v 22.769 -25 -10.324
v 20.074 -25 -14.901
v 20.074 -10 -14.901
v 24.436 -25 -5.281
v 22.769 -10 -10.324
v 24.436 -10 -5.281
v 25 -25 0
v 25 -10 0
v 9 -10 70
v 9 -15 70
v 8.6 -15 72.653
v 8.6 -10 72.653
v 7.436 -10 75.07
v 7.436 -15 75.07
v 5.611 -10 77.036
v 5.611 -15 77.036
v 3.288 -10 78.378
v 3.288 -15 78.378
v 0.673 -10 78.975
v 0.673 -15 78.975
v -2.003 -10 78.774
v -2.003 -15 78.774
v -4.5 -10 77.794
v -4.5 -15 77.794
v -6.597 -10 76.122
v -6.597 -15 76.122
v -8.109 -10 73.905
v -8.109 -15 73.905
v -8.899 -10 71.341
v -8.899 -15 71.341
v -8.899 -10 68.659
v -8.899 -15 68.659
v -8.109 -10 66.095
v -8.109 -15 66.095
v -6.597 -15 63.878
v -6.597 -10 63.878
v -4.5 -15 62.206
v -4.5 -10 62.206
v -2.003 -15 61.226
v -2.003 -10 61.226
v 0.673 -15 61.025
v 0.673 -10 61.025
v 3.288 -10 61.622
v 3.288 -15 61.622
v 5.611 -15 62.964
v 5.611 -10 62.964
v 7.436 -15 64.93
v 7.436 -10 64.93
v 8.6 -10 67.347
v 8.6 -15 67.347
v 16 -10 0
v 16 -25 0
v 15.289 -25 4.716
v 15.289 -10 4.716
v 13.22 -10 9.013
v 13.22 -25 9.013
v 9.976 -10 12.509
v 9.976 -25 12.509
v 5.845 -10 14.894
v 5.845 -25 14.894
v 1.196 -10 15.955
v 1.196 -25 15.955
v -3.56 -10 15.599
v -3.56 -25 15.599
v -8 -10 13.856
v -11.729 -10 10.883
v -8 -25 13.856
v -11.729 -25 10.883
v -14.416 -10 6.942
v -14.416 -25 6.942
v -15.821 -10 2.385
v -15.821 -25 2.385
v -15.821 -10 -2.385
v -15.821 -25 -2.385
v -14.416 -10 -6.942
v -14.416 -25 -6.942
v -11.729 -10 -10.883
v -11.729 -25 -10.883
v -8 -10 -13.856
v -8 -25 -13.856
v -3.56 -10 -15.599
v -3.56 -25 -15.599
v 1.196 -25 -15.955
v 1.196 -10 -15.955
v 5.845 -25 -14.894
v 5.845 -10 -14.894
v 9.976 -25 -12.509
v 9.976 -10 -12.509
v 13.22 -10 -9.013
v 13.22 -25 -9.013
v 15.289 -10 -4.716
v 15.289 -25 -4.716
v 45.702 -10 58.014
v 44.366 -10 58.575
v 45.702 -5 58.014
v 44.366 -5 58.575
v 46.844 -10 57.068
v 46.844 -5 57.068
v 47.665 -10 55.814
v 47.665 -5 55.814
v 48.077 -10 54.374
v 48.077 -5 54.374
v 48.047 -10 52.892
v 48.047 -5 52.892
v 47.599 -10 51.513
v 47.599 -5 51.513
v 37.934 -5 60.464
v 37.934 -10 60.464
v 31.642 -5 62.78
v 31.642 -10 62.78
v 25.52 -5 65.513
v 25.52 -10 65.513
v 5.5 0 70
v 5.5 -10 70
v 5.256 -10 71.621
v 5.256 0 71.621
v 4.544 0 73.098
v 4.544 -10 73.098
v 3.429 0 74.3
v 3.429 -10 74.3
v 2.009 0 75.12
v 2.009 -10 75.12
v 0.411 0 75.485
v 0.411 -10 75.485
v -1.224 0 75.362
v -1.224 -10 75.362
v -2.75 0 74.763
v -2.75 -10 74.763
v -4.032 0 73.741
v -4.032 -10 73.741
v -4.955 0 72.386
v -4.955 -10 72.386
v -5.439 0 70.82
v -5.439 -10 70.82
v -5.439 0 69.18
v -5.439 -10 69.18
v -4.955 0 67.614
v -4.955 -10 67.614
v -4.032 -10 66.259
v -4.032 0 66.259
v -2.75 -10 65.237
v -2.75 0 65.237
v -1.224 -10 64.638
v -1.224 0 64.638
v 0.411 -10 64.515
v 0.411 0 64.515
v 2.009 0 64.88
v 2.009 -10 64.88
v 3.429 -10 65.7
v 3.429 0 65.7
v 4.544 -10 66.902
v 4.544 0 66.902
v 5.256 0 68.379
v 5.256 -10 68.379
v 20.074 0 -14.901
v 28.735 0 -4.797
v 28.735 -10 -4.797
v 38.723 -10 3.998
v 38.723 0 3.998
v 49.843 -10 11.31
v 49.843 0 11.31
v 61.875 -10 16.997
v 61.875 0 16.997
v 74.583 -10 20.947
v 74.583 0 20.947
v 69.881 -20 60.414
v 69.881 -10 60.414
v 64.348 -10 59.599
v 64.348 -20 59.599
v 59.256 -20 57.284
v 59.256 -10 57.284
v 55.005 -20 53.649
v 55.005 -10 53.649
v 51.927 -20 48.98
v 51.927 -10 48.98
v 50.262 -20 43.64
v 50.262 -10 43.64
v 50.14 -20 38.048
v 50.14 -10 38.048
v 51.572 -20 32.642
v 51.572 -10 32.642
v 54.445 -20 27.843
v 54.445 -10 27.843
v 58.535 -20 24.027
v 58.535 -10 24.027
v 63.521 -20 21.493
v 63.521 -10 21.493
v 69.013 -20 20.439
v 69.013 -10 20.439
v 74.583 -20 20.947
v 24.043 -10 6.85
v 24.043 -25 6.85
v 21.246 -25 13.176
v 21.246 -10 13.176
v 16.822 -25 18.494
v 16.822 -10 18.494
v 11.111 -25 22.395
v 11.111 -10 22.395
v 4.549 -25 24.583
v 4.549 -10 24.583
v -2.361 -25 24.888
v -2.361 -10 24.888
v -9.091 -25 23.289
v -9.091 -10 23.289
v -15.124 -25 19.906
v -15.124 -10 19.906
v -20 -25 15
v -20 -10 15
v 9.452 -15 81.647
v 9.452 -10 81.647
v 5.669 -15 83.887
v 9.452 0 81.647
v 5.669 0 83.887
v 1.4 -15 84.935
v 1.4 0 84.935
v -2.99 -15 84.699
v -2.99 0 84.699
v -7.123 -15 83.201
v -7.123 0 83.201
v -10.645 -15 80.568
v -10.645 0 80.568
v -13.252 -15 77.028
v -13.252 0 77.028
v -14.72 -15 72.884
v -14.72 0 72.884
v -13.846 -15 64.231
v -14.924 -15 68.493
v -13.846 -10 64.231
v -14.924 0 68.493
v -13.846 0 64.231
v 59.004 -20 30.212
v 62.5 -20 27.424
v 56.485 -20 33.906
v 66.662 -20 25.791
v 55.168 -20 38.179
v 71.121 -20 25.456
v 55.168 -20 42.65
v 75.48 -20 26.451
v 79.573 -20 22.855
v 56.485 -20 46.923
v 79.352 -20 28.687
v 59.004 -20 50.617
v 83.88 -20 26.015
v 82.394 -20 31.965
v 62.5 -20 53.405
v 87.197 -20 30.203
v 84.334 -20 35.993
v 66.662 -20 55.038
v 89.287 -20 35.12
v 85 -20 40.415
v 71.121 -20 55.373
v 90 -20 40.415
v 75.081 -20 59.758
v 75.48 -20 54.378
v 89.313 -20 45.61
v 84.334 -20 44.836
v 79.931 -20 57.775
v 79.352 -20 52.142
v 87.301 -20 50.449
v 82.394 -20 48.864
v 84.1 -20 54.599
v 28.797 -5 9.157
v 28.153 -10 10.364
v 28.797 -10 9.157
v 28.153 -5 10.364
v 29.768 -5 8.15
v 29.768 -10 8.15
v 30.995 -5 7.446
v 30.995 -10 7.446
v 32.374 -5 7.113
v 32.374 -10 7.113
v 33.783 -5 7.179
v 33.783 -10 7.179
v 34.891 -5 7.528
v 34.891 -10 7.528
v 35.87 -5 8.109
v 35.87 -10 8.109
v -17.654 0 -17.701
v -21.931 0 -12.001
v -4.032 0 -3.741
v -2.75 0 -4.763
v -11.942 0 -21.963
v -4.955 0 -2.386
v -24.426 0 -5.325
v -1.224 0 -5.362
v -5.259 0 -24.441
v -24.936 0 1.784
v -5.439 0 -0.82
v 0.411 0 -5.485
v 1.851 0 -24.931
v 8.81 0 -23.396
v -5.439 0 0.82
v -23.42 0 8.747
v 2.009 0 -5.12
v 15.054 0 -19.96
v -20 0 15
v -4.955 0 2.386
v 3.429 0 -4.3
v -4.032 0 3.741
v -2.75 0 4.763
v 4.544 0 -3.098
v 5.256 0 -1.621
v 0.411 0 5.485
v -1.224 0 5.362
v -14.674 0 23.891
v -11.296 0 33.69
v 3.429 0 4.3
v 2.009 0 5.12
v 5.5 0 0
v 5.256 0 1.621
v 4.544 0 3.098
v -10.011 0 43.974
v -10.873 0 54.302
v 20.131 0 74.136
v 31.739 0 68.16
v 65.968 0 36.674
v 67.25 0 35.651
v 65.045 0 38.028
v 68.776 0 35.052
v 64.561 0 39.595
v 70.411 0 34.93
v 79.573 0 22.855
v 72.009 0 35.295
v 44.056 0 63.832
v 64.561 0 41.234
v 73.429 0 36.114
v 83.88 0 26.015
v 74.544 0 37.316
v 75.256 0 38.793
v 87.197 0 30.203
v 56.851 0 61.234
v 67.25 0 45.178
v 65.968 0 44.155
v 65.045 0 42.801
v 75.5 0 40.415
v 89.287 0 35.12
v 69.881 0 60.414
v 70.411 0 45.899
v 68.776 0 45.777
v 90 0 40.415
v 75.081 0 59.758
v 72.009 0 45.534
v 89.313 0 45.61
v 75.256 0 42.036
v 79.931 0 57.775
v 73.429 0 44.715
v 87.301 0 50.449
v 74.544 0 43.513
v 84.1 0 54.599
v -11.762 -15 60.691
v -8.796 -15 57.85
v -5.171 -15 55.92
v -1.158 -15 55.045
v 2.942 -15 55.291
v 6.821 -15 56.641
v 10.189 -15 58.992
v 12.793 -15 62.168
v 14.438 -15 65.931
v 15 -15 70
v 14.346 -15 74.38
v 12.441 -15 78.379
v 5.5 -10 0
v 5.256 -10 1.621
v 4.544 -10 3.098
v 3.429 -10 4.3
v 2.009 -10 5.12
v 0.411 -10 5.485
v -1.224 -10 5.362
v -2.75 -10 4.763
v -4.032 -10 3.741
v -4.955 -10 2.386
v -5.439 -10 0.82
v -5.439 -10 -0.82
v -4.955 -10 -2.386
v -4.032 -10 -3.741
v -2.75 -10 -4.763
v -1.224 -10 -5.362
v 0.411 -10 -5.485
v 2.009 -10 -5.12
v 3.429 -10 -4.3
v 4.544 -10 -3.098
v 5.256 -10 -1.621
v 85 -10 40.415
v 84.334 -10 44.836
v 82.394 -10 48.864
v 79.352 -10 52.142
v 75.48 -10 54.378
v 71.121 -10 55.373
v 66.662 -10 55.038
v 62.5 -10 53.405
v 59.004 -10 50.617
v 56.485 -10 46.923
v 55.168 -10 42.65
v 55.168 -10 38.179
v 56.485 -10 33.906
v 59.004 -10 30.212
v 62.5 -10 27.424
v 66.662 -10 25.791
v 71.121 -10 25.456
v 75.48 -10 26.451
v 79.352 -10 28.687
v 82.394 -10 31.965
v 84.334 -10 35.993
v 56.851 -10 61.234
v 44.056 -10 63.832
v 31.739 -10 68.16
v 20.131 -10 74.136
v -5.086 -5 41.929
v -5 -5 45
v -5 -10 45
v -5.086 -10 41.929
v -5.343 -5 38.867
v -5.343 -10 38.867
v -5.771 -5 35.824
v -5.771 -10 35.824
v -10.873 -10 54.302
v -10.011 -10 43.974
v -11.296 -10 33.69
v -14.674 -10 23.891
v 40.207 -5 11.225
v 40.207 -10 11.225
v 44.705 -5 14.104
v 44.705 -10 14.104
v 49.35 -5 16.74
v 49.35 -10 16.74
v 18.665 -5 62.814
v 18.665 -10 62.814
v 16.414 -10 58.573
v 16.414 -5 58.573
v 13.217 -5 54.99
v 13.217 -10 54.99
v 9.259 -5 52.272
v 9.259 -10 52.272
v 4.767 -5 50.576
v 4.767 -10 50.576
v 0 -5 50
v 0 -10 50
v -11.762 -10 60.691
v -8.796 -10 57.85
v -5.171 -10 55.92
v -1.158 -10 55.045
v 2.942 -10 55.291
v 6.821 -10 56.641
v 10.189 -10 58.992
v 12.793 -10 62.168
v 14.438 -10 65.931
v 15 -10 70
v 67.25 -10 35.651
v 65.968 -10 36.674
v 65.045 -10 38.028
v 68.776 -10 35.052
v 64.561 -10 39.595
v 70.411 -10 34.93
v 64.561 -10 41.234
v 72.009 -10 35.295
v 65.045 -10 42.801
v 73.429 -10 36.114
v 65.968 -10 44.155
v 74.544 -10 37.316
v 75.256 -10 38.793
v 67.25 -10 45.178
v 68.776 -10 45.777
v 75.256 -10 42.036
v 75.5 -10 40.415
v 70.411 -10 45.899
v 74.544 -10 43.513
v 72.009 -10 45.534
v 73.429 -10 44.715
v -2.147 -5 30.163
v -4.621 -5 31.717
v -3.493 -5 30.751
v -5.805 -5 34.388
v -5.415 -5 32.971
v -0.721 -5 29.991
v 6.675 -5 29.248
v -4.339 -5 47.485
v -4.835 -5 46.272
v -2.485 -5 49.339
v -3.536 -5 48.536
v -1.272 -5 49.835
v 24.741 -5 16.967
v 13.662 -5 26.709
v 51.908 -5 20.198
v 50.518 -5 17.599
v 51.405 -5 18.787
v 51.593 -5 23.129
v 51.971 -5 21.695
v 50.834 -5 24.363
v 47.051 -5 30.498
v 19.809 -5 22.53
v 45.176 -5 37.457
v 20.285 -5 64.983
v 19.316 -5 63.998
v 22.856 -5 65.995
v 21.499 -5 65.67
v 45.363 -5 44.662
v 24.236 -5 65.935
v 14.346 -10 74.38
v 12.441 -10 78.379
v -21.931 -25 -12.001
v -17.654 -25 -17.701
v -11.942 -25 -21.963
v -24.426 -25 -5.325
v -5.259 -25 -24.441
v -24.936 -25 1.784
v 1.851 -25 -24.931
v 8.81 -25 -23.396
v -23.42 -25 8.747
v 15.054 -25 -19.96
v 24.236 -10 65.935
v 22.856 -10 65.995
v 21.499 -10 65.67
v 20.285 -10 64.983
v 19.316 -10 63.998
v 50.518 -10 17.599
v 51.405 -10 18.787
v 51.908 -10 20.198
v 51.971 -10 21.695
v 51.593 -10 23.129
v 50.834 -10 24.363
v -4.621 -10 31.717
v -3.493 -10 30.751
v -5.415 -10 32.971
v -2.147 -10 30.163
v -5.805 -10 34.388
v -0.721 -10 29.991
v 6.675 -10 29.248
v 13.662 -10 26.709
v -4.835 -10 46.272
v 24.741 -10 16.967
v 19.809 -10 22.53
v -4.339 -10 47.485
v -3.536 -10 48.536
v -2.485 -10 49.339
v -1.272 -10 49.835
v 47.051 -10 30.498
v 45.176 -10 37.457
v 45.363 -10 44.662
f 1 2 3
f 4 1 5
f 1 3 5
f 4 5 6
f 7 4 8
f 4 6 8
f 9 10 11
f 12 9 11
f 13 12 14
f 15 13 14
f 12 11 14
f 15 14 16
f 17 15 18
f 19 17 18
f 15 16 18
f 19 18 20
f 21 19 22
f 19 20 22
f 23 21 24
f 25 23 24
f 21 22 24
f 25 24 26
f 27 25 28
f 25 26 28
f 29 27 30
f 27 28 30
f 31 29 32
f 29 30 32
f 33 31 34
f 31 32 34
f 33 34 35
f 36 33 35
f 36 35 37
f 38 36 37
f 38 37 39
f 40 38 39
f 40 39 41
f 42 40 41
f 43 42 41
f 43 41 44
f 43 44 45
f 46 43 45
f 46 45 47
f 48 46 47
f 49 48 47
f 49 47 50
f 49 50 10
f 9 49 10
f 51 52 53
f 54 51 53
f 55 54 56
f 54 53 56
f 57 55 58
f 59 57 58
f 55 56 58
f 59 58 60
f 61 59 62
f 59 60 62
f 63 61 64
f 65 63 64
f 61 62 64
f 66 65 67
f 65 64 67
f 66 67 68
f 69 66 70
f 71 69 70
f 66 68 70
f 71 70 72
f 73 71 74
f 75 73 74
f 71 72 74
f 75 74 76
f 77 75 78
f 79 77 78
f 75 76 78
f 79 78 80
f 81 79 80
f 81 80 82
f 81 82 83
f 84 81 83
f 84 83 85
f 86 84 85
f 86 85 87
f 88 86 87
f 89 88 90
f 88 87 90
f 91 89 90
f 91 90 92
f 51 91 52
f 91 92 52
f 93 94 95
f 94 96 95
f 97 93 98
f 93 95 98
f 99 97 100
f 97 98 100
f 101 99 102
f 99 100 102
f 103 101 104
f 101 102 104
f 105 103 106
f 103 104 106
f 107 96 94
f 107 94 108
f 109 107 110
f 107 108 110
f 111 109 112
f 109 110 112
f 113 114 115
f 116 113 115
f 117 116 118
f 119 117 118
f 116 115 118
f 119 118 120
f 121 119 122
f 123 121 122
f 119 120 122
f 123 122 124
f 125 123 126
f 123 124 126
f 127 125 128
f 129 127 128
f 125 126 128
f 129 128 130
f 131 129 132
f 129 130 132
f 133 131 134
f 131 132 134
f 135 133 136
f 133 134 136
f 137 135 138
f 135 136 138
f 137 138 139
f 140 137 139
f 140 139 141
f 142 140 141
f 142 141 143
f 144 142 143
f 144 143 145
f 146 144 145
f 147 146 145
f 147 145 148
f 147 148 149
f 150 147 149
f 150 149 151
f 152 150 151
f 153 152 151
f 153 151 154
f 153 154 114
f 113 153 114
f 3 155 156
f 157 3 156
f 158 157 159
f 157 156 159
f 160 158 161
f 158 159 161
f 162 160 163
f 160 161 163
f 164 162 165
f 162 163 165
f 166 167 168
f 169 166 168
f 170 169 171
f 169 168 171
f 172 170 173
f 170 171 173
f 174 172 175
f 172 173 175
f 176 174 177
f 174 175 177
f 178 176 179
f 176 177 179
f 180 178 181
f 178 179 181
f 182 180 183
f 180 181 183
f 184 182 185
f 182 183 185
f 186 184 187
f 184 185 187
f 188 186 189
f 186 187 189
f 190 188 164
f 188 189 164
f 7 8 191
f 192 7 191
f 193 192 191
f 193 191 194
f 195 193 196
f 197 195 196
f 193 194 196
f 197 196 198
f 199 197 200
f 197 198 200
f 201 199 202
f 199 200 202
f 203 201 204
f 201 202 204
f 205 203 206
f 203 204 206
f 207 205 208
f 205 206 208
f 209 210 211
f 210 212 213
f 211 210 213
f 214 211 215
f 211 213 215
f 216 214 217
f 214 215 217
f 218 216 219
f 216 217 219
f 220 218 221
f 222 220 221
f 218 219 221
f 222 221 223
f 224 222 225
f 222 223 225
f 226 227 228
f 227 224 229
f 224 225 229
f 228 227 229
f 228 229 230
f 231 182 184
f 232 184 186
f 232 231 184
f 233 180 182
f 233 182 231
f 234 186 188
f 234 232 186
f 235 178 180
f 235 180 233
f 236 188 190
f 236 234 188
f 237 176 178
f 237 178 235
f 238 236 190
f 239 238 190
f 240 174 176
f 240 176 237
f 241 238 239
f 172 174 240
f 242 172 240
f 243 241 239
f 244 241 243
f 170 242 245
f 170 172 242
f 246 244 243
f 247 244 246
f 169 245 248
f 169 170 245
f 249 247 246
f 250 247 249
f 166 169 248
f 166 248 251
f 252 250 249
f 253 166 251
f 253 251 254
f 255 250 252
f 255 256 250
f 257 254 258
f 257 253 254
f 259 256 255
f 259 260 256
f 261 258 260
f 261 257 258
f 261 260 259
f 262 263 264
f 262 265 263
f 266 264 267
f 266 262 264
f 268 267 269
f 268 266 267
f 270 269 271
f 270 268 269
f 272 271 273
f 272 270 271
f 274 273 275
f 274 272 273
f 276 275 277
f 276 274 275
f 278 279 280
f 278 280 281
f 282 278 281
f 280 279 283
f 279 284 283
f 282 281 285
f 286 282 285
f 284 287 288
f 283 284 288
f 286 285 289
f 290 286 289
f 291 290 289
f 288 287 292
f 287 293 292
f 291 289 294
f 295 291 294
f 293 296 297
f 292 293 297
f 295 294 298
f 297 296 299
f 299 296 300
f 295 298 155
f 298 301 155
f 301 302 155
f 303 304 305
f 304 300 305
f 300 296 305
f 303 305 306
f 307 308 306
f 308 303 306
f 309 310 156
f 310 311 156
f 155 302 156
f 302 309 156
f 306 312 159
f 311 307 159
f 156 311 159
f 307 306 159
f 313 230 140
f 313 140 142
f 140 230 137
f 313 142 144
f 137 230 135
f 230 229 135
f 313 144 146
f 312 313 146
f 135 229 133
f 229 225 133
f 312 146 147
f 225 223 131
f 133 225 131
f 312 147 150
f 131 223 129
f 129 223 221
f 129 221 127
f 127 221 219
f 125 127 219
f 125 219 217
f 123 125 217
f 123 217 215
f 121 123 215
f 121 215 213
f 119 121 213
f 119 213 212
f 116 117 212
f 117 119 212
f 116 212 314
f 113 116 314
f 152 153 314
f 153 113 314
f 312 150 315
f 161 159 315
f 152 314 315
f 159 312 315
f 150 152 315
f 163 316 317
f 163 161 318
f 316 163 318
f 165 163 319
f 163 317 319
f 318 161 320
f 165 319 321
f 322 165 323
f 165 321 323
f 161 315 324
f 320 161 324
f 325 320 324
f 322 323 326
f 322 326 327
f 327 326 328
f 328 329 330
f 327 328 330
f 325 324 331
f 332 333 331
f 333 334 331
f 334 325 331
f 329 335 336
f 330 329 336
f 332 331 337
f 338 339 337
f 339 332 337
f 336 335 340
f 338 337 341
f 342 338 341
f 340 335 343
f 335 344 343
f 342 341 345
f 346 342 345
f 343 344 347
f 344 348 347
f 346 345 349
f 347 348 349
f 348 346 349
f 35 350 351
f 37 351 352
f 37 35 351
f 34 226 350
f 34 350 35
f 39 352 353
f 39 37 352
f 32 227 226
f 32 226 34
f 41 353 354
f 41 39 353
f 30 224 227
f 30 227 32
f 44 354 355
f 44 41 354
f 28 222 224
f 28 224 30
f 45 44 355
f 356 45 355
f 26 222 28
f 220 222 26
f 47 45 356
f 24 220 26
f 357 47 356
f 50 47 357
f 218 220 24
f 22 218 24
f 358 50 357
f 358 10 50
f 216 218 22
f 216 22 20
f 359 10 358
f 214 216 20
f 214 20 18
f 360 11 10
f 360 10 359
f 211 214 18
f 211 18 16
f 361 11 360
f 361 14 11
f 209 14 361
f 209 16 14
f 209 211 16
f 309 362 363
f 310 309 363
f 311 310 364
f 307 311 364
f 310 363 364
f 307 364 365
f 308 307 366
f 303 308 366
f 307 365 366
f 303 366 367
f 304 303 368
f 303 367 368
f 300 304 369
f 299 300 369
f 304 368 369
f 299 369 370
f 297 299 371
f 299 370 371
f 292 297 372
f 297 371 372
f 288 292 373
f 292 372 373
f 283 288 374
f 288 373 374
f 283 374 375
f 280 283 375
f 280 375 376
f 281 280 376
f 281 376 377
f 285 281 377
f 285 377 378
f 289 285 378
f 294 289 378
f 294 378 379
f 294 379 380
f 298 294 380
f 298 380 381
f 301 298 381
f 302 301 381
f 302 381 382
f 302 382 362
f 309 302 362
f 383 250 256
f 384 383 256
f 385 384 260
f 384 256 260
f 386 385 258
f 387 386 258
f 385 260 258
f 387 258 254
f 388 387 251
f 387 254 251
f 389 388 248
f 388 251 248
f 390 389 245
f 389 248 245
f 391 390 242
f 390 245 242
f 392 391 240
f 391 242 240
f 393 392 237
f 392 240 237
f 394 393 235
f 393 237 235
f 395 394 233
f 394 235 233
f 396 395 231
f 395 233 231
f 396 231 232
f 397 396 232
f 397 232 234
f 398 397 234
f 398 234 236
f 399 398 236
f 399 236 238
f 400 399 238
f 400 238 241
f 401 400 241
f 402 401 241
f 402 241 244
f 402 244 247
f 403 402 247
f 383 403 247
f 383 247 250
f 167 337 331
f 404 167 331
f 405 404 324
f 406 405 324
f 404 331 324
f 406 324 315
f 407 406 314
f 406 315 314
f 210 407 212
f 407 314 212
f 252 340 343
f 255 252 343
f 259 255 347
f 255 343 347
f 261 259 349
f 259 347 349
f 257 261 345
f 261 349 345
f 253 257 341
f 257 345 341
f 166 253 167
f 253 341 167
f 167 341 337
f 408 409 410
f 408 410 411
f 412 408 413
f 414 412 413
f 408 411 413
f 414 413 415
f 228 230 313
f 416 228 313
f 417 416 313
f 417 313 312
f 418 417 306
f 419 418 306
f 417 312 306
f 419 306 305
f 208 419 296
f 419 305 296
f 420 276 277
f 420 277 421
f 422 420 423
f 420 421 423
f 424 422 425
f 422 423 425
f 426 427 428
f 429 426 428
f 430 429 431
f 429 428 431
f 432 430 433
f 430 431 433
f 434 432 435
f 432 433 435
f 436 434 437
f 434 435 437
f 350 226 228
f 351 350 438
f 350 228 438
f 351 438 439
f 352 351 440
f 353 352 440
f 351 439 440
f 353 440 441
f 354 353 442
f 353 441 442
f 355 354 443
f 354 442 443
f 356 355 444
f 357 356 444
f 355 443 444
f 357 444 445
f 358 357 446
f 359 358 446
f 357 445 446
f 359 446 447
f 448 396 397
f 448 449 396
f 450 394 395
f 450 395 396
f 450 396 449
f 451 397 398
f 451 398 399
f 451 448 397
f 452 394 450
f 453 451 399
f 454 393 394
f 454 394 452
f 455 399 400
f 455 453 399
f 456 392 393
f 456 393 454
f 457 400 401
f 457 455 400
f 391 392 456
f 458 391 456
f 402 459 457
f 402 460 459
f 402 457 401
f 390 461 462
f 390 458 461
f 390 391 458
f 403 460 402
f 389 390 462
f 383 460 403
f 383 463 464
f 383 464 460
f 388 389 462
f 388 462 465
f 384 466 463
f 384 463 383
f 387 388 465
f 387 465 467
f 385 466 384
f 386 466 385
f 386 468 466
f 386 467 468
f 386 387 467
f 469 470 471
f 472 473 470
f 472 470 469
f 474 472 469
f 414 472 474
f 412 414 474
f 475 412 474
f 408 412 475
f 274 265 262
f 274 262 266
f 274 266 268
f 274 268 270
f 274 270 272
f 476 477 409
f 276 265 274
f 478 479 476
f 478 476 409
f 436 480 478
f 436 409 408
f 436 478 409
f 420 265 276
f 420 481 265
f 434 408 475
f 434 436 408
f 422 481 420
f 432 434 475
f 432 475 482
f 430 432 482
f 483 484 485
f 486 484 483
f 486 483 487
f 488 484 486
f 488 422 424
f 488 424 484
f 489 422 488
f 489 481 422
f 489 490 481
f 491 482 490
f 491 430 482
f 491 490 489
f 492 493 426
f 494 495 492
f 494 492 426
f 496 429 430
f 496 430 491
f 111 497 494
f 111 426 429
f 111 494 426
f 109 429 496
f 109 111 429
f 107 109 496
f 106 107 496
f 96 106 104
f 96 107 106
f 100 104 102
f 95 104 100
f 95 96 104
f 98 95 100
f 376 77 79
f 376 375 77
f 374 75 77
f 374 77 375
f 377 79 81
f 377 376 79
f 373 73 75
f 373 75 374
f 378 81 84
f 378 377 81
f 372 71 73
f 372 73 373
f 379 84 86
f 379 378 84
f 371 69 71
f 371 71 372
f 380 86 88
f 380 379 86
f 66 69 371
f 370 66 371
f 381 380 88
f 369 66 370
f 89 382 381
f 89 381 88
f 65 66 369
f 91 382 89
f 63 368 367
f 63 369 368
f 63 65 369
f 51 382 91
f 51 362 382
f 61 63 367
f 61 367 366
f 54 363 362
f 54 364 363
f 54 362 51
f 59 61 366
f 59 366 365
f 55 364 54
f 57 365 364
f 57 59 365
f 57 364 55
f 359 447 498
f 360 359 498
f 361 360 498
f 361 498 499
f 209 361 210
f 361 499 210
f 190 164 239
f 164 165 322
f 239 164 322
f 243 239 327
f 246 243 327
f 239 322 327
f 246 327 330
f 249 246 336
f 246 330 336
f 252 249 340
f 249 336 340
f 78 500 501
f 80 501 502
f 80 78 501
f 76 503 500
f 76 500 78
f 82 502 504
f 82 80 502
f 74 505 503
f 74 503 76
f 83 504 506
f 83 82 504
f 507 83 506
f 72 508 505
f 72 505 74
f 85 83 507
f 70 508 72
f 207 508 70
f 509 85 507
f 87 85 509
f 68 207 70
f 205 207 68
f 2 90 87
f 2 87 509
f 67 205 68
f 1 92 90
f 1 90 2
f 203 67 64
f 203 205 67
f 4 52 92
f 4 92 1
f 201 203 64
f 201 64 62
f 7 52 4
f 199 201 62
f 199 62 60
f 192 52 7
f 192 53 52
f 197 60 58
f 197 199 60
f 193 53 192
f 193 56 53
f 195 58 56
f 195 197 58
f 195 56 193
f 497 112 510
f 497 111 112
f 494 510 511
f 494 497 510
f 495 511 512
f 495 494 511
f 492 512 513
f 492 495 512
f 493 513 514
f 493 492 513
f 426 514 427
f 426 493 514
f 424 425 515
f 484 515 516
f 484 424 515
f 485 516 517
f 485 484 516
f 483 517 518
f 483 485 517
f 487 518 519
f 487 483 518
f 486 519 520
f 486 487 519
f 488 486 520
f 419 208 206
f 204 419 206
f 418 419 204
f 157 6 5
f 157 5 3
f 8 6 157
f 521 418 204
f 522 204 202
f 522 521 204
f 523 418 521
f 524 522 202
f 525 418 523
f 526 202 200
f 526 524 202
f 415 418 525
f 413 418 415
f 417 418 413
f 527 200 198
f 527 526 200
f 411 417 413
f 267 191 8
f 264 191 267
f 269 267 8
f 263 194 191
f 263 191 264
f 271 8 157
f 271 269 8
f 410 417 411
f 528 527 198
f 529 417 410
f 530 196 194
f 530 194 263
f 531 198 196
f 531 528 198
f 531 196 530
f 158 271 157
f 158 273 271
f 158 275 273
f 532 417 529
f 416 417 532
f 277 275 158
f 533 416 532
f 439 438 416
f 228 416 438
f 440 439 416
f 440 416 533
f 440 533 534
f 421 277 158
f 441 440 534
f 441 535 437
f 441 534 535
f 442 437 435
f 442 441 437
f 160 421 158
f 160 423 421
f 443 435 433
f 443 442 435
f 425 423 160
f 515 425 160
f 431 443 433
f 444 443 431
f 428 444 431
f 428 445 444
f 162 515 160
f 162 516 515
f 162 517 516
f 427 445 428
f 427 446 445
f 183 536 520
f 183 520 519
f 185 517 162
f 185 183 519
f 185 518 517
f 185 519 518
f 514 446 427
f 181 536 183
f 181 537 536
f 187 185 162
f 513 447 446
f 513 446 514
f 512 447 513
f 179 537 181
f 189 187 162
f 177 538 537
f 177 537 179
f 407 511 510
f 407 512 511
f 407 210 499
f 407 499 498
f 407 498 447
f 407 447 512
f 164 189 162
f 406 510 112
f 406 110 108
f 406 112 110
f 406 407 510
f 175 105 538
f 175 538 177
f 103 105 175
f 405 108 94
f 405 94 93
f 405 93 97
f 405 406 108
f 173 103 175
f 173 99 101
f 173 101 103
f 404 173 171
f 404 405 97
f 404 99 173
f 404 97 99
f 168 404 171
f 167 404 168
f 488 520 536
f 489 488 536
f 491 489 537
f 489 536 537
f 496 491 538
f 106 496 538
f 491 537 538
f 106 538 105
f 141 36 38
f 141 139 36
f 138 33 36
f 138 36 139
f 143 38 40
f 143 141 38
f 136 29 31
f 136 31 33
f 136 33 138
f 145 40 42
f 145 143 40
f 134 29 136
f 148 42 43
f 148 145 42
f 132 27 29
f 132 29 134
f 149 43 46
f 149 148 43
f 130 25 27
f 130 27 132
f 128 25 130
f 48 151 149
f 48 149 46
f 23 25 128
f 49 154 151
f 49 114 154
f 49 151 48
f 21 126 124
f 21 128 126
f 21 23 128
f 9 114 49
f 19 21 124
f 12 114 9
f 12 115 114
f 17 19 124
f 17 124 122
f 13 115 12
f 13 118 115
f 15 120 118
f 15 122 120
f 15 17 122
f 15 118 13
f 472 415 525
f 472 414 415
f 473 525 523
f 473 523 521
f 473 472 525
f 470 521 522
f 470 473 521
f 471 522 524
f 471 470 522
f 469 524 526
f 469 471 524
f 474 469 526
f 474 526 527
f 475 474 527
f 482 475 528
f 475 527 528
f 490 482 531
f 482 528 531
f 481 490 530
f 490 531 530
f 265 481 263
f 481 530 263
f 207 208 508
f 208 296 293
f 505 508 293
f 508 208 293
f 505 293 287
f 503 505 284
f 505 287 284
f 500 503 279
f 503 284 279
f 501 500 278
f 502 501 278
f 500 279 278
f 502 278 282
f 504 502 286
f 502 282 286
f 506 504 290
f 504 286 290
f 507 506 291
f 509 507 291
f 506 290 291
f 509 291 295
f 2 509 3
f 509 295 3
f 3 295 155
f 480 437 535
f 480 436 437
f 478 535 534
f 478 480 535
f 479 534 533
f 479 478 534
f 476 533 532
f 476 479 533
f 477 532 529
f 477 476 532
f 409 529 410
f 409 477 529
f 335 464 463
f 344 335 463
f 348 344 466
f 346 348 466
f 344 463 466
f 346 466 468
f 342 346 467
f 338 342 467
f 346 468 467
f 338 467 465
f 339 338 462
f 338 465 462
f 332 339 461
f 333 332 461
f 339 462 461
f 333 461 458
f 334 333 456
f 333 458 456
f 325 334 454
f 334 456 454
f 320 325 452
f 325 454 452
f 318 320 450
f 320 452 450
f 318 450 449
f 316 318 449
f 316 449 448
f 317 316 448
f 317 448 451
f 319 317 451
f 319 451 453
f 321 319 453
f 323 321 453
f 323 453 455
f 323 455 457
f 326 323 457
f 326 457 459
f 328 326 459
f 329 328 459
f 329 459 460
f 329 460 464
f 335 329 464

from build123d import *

# Parameters (mm, degrees)
F1_DEPTH  = 10
F2_DEPTH  = 15
F3_DEPTH  = 25
F4_DEPTH  = 20
F5_R      = 16
F5_R_2    = 9
F5_R_3    = 15
F6_DEPTH  = 15
F7_R      = 5.5
F8_DEPTH  = 10.001
F10_DEPTH = 5
F11_R     = 5


with BuildPart() as f1:
    # F0 (on Front) → F1 (new body)
    with BuildSketch(Plane.XZ):
        with BuildLine():
            ThreePointArc((-20, 15), (7.905694, 23.717082), (25, 0))
            ThreePointArc((25, 0), (23.736535, -7.847096), (20.073847, -14.901029))
            ThreePointArc((20.073847, -14.901029), (44.154845, 7.848858), (74.583385, 20.946787))
            ThreePointArc((74.583385, 20.946787), (50.140462, 38.048353), (69.881043, 60.414165))
            ThreePointArc((69.881043, 60.414165), (37.823204, 65.784342), (9.452181, 81.647157))
            ThreePointArc((9.452181, 81.647157), (13.542207, 76.450476), (15, 70))
            ThreePointArc((15, 70), (2.941742, 55.29129), (-13.846154, 64.230769))
            ThreePointArc((-13.846154, 64.230769), (-10.386106, 38.798263), (-20, 15))
        make_face()
    extrude(amount=F1_DEPTH)

    # F0 (on Front) → F2 (join)
    with BuildSketch(Plane.XZ):
        with BuildLine():
            ThreePointArc((9.452181, 81.647157), (-8.981057, 82.014184), (-13.846154, 64.230769))
            ThreePointArc((-13.846154, 64.230769), (2.941742, 55.29129), (15, 70))
            ThreePointArc((15, 70), (13.542207, 76.450476), (9.452181, 81.647157))
        make_face()
    extrude(amount=F2_DEPTH)

    # F0 (on Front) → F3 (join)
    with BuildSketch(Plane.XZ):
        with BuildLine():
            ThreePointArc((20.073847, -14.901029), (23.736535, -7.847096), (25, 0))
            ThreePointArc((25, 0), (7.905694, 23.717082), (-20, 15))
            ThreePointArc((-20, 15), (-14.95056, -20.036985), (20.073847, -14.901029))
        make_face()
    extrude(amount=F3_DEPTH)

    # F0 (on Front) → F4 (join)
    with BuildSketch(Plane.XZ):
        with BuildLine():
            ThreePointArc((69.881043, 60.414165), (50.140462, 38.048353), (74.583385, 20.946787))
            ThreePointArc((74.583385, 20.946787), (85.67909, 27.998153), (90, 40.414519))
            ThreePointArc((90, 40.414519), (84.100015, 54.59865), (69.881043, 60.414165))
        make_face()
    extrude(amount=F4_DEPTH)

    # F5 (on face) → F6 (cut)
    with BuildSketch(Plane.XZ.offset(25)):
        Circle(F5_R)
        with Locations((0, 70)):
            Circle(F5_R_2)
        with Locations((70, 40.414519)):
            Circle(F5_R_3)
    extrude(amount=-F6_DEPTH, mode=Mode.SUBTRACT)

    # F7 (on face) → F8 (cut, through all)
    with BuildSketch(Plane.XZ.offset(10)):
        Circle(F7_R)
        with Locations((0, 70)):
            Circle(F7_R)
        with Locations((70, 40.414519)):
            Circle(F7_R)
    extrude(amount=-F8_DEPTH, mode=Mode.SUBTRACT)

    # F9 (on face) → F10 (cut)
    with BuildSketch(Plane.XZ.offset(10)):
        with BuildLine():
            ThreePointArc((51.331935, 57.042909), (35.156253, 61.427848), (19.940051, 68.452632))
            ThreePointArc((19.940051, 68.452632), (11.500487, 53.637274), (-5.297662, 50.714389))
            ThreePointArc((-5.297662, 50.714389), (-5.246639, 39.797168), (-7.352958, 29.084945))
            ThreePointArc((-7.352958, 29.084945), (17.164465, 24.604494), (29.835004, 3.142063))
            ThreePointArc((29.835004, 3.142063), (42.1494, 12.509642), (55.761443, 19.865468))
            ThreePointArc((55.761443, 19.865468), (45.175577, 37.456812), (51.331935, 57.042909))
        make_face()
    extrude(amount=-F10_DEPTH, mode=Mode.SUBTRACT)

    # F11
    f11_edges = [f1.edges().sort_by_distance(p)[0] for p in [
        (19.940051, -7.5, 68.452632),
        (-5.297662, -7.5, 50.714389),
        (51.331935, -7.5, 57.042909),
        (55.761443, -7.5, 19.865468),
        (-7.352958, -7.5, 29.084945),
        (29.835004, -7.5, 3.142063),
    ]]
    fillet(f11_edges, radius=F11_R)


solid = f1.part
